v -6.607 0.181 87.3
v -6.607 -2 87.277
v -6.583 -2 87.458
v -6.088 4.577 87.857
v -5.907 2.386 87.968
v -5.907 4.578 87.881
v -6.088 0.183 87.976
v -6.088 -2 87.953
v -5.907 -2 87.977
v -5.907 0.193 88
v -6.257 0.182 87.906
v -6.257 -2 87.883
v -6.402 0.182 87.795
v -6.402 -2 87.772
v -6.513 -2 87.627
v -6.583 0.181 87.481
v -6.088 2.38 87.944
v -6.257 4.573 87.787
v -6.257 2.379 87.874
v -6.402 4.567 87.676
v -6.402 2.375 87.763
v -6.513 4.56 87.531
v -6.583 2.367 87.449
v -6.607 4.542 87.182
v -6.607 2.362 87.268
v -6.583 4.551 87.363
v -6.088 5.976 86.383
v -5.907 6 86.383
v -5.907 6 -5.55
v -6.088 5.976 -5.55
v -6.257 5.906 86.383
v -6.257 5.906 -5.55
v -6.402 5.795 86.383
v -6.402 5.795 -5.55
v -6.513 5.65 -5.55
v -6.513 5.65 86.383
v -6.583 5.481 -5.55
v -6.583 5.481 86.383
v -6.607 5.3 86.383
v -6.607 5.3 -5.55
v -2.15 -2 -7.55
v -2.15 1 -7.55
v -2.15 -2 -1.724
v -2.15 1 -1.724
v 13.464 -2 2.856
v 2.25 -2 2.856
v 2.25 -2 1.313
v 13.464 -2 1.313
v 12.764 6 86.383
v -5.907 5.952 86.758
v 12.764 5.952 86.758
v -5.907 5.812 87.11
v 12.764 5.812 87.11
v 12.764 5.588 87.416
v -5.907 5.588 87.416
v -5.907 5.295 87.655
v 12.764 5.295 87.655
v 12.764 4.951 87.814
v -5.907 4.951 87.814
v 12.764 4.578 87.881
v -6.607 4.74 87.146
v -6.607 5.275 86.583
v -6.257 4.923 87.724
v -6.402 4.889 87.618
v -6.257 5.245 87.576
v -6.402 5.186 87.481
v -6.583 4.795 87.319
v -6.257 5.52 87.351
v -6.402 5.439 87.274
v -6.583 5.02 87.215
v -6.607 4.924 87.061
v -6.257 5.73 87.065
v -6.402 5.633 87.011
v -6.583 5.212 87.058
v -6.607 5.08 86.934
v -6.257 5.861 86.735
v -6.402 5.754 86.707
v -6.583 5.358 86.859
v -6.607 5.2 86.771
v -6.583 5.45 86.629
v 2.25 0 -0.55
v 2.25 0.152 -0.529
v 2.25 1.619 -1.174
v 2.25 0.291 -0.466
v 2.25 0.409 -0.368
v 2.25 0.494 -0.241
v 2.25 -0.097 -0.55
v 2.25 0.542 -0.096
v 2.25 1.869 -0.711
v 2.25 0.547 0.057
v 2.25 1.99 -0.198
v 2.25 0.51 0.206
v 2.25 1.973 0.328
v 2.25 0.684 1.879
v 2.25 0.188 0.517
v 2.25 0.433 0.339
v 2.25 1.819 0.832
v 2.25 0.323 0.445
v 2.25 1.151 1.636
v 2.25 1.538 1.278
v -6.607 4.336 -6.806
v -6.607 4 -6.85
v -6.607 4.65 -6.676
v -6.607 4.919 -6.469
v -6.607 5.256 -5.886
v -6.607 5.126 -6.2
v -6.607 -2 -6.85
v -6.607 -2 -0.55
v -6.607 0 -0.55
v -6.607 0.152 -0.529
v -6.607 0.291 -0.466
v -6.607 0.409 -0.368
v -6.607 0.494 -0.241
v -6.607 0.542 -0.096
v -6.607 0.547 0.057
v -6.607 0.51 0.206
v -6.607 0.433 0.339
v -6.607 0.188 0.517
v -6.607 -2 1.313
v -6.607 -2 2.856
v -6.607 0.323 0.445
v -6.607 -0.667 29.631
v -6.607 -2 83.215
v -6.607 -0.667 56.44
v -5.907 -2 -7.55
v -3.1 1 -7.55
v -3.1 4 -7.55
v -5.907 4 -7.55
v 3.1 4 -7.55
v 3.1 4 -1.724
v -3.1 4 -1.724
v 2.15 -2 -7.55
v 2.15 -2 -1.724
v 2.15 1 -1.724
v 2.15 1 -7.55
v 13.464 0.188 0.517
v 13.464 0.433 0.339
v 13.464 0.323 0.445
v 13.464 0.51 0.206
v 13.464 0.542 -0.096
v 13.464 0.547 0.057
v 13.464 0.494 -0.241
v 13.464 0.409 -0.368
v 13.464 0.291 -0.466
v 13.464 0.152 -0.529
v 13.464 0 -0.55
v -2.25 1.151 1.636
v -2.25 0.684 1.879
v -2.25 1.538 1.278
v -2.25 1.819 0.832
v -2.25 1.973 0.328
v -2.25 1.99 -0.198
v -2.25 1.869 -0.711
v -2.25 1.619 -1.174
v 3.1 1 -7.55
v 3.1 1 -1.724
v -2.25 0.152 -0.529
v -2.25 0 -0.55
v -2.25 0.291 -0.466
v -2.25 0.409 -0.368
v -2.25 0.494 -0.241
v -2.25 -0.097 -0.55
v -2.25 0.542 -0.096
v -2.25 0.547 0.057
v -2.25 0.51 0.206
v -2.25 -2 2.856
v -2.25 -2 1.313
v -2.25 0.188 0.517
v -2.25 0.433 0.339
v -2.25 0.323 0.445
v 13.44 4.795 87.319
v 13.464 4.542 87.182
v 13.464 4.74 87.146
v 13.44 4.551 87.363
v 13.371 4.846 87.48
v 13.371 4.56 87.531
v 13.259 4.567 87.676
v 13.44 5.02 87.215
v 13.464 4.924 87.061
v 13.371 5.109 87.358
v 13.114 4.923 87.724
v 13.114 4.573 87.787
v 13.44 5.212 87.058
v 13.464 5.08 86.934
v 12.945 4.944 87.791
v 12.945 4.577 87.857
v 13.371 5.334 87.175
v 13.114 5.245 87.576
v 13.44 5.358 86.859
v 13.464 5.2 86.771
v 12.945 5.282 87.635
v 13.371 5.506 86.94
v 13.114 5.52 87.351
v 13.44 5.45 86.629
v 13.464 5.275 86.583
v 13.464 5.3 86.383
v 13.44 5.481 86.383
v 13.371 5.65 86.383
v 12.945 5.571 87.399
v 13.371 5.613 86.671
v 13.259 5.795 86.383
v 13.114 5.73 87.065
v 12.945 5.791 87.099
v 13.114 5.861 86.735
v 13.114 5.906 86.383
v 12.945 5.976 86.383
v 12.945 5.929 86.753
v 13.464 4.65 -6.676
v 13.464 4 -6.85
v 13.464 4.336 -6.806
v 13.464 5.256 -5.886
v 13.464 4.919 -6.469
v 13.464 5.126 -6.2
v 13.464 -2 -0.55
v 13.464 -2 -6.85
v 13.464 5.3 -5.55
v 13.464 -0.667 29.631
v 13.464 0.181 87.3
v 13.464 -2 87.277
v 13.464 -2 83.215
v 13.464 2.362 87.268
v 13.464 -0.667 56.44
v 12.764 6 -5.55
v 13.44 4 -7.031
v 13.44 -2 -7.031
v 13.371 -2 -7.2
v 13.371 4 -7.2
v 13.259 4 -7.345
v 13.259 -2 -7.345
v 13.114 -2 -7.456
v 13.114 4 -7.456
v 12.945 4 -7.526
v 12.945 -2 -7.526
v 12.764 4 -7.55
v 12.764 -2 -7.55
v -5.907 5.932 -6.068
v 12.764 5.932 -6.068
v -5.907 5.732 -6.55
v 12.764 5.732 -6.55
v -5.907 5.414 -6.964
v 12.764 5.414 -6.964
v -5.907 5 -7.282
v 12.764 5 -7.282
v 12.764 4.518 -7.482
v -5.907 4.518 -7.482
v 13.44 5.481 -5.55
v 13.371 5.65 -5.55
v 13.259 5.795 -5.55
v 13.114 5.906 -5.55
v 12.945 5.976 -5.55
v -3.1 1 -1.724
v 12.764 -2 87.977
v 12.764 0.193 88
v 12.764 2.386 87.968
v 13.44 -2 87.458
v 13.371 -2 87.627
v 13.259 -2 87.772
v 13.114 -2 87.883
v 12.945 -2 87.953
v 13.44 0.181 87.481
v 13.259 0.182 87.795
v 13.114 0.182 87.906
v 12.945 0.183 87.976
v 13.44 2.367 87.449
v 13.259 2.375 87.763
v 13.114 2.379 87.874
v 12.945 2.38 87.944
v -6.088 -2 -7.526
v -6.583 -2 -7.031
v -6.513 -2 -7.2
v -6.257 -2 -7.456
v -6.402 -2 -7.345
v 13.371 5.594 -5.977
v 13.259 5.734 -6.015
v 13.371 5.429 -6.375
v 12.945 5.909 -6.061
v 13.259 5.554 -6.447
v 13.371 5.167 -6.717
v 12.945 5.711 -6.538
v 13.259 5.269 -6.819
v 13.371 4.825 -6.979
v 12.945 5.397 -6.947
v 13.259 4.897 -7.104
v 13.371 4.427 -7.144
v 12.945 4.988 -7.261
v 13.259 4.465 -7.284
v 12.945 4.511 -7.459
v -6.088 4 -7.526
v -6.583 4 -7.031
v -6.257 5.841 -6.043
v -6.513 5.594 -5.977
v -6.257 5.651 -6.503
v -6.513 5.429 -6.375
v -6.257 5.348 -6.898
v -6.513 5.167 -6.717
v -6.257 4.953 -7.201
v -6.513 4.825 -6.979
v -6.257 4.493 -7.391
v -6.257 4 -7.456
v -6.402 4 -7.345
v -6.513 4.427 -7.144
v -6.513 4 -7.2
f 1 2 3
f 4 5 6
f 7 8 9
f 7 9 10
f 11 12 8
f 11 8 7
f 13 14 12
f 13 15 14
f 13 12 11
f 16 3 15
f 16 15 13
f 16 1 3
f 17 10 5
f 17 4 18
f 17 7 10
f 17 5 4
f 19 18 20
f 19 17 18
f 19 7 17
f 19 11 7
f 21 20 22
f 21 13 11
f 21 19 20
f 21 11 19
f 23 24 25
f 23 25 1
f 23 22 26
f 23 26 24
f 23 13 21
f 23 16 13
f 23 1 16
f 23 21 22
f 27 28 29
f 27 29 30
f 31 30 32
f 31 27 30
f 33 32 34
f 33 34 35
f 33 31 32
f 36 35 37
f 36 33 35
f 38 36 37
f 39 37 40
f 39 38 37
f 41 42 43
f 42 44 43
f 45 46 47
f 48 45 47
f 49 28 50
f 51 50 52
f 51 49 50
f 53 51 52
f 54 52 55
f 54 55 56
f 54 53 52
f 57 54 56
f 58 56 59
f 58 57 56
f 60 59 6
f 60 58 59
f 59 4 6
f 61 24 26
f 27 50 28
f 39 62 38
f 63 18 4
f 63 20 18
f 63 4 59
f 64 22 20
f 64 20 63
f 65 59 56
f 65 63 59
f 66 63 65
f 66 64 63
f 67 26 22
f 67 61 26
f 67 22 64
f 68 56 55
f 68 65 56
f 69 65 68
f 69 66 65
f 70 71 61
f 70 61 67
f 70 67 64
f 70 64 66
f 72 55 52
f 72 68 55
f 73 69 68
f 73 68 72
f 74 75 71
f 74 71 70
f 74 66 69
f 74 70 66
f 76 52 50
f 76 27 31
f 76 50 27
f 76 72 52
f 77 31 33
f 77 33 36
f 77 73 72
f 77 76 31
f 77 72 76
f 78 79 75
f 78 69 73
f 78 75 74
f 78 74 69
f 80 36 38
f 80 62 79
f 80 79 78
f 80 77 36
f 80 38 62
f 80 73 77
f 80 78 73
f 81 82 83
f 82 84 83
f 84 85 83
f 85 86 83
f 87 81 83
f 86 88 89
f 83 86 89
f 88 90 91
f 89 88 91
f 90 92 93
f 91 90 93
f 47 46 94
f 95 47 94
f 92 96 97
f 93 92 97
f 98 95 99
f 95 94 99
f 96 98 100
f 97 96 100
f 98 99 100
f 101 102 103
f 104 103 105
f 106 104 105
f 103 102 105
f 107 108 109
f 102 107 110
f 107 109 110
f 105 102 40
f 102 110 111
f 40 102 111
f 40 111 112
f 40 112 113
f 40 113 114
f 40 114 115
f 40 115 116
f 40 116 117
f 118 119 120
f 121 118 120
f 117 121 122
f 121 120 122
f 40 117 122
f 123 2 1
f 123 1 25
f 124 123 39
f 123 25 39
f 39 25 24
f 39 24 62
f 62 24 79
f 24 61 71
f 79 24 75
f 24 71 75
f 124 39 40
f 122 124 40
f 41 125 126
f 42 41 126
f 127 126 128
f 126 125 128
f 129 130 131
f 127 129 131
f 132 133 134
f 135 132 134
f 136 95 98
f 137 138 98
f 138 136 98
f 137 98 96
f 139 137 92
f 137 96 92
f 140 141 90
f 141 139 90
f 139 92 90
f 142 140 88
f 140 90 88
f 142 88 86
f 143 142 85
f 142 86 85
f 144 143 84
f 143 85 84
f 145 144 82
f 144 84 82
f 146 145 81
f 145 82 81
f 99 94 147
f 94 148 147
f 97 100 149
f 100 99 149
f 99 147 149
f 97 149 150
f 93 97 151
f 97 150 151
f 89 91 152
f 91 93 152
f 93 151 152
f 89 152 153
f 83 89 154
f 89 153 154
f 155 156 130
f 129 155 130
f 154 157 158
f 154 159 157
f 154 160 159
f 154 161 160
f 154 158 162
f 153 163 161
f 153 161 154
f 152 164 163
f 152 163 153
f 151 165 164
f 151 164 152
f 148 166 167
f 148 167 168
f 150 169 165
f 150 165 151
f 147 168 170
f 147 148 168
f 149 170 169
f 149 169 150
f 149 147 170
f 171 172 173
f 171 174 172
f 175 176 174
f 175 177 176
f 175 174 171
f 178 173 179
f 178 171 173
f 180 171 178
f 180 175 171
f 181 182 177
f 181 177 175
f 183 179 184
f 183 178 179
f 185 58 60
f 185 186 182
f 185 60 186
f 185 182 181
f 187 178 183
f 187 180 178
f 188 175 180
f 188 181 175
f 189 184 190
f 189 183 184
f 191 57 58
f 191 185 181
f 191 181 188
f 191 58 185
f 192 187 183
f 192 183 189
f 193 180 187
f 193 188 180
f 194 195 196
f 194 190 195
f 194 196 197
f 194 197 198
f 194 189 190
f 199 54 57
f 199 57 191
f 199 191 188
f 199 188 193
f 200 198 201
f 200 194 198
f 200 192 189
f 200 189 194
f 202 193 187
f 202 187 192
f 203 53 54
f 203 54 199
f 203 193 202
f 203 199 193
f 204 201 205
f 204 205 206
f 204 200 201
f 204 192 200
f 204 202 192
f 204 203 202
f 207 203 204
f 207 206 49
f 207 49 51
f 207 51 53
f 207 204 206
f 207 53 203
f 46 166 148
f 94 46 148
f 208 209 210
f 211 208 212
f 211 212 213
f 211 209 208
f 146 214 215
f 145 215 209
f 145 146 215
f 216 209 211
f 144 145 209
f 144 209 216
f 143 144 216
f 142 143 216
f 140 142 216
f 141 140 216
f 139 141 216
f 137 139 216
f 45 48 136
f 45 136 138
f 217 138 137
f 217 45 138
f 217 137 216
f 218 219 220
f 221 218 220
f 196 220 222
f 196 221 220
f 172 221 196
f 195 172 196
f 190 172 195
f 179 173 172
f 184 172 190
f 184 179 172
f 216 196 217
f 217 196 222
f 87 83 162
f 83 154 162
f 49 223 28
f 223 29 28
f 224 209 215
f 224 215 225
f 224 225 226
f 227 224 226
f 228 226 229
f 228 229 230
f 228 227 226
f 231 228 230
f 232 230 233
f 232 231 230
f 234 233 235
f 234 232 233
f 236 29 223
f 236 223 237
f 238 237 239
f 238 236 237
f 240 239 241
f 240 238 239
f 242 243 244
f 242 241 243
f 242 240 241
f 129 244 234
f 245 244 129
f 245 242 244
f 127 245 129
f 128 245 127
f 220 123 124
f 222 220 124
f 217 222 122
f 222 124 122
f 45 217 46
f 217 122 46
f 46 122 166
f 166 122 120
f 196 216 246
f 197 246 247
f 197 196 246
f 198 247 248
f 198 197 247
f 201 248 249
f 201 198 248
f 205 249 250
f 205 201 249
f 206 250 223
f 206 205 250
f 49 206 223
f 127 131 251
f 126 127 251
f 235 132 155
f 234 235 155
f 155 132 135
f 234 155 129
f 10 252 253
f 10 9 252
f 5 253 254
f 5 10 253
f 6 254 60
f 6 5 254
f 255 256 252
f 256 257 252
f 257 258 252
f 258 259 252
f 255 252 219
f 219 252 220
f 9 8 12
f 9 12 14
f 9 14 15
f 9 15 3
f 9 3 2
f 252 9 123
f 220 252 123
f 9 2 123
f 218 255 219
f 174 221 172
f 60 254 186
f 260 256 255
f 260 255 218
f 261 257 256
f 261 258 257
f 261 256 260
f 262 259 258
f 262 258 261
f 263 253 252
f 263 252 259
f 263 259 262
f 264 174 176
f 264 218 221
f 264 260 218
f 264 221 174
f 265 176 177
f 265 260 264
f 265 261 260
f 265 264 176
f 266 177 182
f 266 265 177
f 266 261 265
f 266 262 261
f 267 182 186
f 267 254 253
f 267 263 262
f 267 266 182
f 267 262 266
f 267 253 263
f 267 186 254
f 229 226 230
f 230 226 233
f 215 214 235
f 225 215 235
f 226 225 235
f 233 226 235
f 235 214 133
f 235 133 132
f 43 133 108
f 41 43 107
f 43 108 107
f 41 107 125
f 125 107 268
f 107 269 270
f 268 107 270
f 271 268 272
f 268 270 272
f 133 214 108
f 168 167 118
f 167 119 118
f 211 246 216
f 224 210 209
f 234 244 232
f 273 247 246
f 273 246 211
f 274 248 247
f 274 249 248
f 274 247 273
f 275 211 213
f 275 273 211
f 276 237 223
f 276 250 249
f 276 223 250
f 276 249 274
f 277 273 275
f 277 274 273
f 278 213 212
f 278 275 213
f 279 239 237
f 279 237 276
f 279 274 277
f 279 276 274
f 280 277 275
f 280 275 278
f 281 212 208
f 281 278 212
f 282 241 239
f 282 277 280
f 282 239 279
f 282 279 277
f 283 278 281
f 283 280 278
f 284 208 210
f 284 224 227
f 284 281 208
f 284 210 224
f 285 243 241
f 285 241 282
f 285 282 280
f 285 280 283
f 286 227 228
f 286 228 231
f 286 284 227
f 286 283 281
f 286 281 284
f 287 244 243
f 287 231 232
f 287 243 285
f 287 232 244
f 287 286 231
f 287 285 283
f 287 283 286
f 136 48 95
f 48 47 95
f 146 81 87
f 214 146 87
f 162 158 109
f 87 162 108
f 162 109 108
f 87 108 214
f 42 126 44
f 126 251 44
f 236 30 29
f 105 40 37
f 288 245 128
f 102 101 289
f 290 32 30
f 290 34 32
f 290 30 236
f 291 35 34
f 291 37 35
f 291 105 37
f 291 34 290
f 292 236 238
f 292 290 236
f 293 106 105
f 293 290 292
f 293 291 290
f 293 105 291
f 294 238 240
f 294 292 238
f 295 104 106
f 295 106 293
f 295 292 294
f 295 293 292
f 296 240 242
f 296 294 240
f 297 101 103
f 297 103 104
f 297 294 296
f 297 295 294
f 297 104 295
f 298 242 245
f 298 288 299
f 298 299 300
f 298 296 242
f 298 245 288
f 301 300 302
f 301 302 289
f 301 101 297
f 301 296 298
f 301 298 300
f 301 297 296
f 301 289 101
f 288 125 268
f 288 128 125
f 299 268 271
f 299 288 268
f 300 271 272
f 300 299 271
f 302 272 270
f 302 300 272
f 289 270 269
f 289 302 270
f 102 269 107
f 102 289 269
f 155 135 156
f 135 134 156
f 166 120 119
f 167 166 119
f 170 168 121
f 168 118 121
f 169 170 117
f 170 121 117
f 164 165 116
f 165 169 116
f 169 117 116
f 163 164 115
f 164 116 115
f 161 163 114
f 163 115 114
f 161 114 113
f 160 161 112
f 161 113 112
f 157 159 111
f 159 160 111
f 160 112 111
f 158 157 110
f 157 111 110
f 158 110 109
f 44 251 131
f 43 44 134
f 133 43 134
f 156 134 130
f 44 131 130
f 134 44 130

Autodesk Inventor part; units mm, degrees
ref_plane "YZ Plane" through (0, 0, 0) normal (1, 0, 0) x (0, 1, 0)
ref_plane "XZ Plane" through (0, 0, 0) normal (0, 1, 0) x (-1, 0, 0)
ref_plane "Slot Start Plane" through (0, 0, -1.7245) normal (0, 0, 1) x (1, 0, 0)
sketch "Key Profile" plane through (0, 0, 0) normal (1, 0, 0) x (0, 1, 0)
  line L0 (-2, 2.8563) -> (0.684, 1.8794)
  arc A0 (1.6188, -1.1745) -> (0.684, 1.8794) centre (0, 0) ccw
  line L1 (-2, 1.3132) -> (0.1881, 0.5168)
  arc A1 (0, -0.55) -> (0.1881, 0.5168) centre (0, 0) ccw
  line L2 (-2, 2.8563) -> (-2, -0.55)
  line L3 (0, 0) -> (-2, 0) construction
  line L4 (0, -0.55) -> (-2, -0.55)
  line L5 (1.6188, -1.1745) -> (-0.097, -0.55)
  line L6 (6, -5.55) -> (6, 87.7952)
  line L7 (-2, 87.9773) -> (-2, 2.8563)
  arc A2 (6, 87.7952) -> (-2, 87.9773) centre (0, 0) ccw
  line L8 (-2, -0.55) -> (-2, -7.55)
  arc A3 (4, -7.55) -> (6, -5.55) centre (4, -5.55) ccw
  line L9 (-2, -7.55) -> (4, -7.55)
  arc A4 (6, 55.1747) -> (-2, 55.464) centre (0, 0) ccw
  arc A5 (-2, 2.8563) -> (-2, 83.2148) centre (-539.3737, 43.0355) ccw
  point P0 (-0.5, 43.0355)
  point P1 (-0.6441, 55.4963)
  dimension "my_hingeCutRad" = 0.55
  dimension "my_hingeDepth" = 2
  dimension "my_hingeRegCutRad" = 2
  dimension "keyLength" = 88
  dimension "my_KeyHeight" = 8
  dimension "d107" = 20
  dimension "d122" = 4
  dimension "slotOffset" = 1.1745
  dimension "my_backWidth" = 7
  dimension "d128" = 55.5
  dimension "d135" = 1.5
  dimension "d136" = 4.7625
extrude "Upper (u)" add sketch "Key Profile" along normal blind 13.4643 and the other way blind 6.6071 contours A5 A4 L6 A3 L9 L8 L4 L5 A0 L0 | L0 A0 L5 L4 A1 L1 L2
extrude "Lower (d)" add sketch "Key Profile" along normal blind 13.4643 and the other way blind 6.6071 contours A5 L7 A2 L6 A4
extrude "Protrusion Cutout" cut sketch "Key Profile" along normal mid plane 4.5 contours L0 A0 L5 L4 A1 L1 L2
fillet "Front Fillet" radius 1.5 1 edges at (3.4286, 6, 87.7952)
sketch "Slot Sketch" plane through (0, 0, -1.7245) normal (0, 0, 1) x (1, 0, 0)
  line L0 (2.15, -2) -> (2.15, 1)
  line L1 (3.1, 4) -> (-3.1, 4)
  line L2 (-2.15, 1) -> (-2.15, -2)
  line L3 (-2.15, -2) -> (2.15, -2)
  line L4 (0, -2) -> (0, 4) construction
  line L5 (-3.1, 4) -> (-3.1, 1)
  line L6 (-3.1, 1) -> (-2.15, 1)
  line L7 (2.15, 1) -> (3.1, 1)
  line L8 (3.1, 1) -> (3.1, 4)
  point P0 (0, 0)
  dimension "d109" = 2
  dimension "my_slotHeadOffset" = 1
  dimension "my_slotHeadHeight" = 3
  dimension "my_slotHeadWidth" = 6.2
  dimension "my_neckSlotWidth" = 4.3
extrude "Slot" cut sketch "Slot Sketch" against normal through all
fillet "Edge Softening" radius 0.7 10 edges at (13.4643, 5.4142, -6.9642) (13.4643, 1, -7.55) (13.4643, 6, 40.4164) (-6.6071, 5.4142, -6.9642) (-6.6071, 1, -7.55) (-6.6071, 6, 40.4164) (-6.6071, 5.5879, 87.4156) (-6.6071, 1.2899, 87.9905) (13.4643, 5.5879, 87.4156) (13.4643, 1.2899, 87.9905)
equation "\"my_headHeight\" = 3"
equation "\"my_headOffset\" = 1"
equation "\"whiteKeyWidth\" = 20.07143"
properties part number "CKey0_Top"
